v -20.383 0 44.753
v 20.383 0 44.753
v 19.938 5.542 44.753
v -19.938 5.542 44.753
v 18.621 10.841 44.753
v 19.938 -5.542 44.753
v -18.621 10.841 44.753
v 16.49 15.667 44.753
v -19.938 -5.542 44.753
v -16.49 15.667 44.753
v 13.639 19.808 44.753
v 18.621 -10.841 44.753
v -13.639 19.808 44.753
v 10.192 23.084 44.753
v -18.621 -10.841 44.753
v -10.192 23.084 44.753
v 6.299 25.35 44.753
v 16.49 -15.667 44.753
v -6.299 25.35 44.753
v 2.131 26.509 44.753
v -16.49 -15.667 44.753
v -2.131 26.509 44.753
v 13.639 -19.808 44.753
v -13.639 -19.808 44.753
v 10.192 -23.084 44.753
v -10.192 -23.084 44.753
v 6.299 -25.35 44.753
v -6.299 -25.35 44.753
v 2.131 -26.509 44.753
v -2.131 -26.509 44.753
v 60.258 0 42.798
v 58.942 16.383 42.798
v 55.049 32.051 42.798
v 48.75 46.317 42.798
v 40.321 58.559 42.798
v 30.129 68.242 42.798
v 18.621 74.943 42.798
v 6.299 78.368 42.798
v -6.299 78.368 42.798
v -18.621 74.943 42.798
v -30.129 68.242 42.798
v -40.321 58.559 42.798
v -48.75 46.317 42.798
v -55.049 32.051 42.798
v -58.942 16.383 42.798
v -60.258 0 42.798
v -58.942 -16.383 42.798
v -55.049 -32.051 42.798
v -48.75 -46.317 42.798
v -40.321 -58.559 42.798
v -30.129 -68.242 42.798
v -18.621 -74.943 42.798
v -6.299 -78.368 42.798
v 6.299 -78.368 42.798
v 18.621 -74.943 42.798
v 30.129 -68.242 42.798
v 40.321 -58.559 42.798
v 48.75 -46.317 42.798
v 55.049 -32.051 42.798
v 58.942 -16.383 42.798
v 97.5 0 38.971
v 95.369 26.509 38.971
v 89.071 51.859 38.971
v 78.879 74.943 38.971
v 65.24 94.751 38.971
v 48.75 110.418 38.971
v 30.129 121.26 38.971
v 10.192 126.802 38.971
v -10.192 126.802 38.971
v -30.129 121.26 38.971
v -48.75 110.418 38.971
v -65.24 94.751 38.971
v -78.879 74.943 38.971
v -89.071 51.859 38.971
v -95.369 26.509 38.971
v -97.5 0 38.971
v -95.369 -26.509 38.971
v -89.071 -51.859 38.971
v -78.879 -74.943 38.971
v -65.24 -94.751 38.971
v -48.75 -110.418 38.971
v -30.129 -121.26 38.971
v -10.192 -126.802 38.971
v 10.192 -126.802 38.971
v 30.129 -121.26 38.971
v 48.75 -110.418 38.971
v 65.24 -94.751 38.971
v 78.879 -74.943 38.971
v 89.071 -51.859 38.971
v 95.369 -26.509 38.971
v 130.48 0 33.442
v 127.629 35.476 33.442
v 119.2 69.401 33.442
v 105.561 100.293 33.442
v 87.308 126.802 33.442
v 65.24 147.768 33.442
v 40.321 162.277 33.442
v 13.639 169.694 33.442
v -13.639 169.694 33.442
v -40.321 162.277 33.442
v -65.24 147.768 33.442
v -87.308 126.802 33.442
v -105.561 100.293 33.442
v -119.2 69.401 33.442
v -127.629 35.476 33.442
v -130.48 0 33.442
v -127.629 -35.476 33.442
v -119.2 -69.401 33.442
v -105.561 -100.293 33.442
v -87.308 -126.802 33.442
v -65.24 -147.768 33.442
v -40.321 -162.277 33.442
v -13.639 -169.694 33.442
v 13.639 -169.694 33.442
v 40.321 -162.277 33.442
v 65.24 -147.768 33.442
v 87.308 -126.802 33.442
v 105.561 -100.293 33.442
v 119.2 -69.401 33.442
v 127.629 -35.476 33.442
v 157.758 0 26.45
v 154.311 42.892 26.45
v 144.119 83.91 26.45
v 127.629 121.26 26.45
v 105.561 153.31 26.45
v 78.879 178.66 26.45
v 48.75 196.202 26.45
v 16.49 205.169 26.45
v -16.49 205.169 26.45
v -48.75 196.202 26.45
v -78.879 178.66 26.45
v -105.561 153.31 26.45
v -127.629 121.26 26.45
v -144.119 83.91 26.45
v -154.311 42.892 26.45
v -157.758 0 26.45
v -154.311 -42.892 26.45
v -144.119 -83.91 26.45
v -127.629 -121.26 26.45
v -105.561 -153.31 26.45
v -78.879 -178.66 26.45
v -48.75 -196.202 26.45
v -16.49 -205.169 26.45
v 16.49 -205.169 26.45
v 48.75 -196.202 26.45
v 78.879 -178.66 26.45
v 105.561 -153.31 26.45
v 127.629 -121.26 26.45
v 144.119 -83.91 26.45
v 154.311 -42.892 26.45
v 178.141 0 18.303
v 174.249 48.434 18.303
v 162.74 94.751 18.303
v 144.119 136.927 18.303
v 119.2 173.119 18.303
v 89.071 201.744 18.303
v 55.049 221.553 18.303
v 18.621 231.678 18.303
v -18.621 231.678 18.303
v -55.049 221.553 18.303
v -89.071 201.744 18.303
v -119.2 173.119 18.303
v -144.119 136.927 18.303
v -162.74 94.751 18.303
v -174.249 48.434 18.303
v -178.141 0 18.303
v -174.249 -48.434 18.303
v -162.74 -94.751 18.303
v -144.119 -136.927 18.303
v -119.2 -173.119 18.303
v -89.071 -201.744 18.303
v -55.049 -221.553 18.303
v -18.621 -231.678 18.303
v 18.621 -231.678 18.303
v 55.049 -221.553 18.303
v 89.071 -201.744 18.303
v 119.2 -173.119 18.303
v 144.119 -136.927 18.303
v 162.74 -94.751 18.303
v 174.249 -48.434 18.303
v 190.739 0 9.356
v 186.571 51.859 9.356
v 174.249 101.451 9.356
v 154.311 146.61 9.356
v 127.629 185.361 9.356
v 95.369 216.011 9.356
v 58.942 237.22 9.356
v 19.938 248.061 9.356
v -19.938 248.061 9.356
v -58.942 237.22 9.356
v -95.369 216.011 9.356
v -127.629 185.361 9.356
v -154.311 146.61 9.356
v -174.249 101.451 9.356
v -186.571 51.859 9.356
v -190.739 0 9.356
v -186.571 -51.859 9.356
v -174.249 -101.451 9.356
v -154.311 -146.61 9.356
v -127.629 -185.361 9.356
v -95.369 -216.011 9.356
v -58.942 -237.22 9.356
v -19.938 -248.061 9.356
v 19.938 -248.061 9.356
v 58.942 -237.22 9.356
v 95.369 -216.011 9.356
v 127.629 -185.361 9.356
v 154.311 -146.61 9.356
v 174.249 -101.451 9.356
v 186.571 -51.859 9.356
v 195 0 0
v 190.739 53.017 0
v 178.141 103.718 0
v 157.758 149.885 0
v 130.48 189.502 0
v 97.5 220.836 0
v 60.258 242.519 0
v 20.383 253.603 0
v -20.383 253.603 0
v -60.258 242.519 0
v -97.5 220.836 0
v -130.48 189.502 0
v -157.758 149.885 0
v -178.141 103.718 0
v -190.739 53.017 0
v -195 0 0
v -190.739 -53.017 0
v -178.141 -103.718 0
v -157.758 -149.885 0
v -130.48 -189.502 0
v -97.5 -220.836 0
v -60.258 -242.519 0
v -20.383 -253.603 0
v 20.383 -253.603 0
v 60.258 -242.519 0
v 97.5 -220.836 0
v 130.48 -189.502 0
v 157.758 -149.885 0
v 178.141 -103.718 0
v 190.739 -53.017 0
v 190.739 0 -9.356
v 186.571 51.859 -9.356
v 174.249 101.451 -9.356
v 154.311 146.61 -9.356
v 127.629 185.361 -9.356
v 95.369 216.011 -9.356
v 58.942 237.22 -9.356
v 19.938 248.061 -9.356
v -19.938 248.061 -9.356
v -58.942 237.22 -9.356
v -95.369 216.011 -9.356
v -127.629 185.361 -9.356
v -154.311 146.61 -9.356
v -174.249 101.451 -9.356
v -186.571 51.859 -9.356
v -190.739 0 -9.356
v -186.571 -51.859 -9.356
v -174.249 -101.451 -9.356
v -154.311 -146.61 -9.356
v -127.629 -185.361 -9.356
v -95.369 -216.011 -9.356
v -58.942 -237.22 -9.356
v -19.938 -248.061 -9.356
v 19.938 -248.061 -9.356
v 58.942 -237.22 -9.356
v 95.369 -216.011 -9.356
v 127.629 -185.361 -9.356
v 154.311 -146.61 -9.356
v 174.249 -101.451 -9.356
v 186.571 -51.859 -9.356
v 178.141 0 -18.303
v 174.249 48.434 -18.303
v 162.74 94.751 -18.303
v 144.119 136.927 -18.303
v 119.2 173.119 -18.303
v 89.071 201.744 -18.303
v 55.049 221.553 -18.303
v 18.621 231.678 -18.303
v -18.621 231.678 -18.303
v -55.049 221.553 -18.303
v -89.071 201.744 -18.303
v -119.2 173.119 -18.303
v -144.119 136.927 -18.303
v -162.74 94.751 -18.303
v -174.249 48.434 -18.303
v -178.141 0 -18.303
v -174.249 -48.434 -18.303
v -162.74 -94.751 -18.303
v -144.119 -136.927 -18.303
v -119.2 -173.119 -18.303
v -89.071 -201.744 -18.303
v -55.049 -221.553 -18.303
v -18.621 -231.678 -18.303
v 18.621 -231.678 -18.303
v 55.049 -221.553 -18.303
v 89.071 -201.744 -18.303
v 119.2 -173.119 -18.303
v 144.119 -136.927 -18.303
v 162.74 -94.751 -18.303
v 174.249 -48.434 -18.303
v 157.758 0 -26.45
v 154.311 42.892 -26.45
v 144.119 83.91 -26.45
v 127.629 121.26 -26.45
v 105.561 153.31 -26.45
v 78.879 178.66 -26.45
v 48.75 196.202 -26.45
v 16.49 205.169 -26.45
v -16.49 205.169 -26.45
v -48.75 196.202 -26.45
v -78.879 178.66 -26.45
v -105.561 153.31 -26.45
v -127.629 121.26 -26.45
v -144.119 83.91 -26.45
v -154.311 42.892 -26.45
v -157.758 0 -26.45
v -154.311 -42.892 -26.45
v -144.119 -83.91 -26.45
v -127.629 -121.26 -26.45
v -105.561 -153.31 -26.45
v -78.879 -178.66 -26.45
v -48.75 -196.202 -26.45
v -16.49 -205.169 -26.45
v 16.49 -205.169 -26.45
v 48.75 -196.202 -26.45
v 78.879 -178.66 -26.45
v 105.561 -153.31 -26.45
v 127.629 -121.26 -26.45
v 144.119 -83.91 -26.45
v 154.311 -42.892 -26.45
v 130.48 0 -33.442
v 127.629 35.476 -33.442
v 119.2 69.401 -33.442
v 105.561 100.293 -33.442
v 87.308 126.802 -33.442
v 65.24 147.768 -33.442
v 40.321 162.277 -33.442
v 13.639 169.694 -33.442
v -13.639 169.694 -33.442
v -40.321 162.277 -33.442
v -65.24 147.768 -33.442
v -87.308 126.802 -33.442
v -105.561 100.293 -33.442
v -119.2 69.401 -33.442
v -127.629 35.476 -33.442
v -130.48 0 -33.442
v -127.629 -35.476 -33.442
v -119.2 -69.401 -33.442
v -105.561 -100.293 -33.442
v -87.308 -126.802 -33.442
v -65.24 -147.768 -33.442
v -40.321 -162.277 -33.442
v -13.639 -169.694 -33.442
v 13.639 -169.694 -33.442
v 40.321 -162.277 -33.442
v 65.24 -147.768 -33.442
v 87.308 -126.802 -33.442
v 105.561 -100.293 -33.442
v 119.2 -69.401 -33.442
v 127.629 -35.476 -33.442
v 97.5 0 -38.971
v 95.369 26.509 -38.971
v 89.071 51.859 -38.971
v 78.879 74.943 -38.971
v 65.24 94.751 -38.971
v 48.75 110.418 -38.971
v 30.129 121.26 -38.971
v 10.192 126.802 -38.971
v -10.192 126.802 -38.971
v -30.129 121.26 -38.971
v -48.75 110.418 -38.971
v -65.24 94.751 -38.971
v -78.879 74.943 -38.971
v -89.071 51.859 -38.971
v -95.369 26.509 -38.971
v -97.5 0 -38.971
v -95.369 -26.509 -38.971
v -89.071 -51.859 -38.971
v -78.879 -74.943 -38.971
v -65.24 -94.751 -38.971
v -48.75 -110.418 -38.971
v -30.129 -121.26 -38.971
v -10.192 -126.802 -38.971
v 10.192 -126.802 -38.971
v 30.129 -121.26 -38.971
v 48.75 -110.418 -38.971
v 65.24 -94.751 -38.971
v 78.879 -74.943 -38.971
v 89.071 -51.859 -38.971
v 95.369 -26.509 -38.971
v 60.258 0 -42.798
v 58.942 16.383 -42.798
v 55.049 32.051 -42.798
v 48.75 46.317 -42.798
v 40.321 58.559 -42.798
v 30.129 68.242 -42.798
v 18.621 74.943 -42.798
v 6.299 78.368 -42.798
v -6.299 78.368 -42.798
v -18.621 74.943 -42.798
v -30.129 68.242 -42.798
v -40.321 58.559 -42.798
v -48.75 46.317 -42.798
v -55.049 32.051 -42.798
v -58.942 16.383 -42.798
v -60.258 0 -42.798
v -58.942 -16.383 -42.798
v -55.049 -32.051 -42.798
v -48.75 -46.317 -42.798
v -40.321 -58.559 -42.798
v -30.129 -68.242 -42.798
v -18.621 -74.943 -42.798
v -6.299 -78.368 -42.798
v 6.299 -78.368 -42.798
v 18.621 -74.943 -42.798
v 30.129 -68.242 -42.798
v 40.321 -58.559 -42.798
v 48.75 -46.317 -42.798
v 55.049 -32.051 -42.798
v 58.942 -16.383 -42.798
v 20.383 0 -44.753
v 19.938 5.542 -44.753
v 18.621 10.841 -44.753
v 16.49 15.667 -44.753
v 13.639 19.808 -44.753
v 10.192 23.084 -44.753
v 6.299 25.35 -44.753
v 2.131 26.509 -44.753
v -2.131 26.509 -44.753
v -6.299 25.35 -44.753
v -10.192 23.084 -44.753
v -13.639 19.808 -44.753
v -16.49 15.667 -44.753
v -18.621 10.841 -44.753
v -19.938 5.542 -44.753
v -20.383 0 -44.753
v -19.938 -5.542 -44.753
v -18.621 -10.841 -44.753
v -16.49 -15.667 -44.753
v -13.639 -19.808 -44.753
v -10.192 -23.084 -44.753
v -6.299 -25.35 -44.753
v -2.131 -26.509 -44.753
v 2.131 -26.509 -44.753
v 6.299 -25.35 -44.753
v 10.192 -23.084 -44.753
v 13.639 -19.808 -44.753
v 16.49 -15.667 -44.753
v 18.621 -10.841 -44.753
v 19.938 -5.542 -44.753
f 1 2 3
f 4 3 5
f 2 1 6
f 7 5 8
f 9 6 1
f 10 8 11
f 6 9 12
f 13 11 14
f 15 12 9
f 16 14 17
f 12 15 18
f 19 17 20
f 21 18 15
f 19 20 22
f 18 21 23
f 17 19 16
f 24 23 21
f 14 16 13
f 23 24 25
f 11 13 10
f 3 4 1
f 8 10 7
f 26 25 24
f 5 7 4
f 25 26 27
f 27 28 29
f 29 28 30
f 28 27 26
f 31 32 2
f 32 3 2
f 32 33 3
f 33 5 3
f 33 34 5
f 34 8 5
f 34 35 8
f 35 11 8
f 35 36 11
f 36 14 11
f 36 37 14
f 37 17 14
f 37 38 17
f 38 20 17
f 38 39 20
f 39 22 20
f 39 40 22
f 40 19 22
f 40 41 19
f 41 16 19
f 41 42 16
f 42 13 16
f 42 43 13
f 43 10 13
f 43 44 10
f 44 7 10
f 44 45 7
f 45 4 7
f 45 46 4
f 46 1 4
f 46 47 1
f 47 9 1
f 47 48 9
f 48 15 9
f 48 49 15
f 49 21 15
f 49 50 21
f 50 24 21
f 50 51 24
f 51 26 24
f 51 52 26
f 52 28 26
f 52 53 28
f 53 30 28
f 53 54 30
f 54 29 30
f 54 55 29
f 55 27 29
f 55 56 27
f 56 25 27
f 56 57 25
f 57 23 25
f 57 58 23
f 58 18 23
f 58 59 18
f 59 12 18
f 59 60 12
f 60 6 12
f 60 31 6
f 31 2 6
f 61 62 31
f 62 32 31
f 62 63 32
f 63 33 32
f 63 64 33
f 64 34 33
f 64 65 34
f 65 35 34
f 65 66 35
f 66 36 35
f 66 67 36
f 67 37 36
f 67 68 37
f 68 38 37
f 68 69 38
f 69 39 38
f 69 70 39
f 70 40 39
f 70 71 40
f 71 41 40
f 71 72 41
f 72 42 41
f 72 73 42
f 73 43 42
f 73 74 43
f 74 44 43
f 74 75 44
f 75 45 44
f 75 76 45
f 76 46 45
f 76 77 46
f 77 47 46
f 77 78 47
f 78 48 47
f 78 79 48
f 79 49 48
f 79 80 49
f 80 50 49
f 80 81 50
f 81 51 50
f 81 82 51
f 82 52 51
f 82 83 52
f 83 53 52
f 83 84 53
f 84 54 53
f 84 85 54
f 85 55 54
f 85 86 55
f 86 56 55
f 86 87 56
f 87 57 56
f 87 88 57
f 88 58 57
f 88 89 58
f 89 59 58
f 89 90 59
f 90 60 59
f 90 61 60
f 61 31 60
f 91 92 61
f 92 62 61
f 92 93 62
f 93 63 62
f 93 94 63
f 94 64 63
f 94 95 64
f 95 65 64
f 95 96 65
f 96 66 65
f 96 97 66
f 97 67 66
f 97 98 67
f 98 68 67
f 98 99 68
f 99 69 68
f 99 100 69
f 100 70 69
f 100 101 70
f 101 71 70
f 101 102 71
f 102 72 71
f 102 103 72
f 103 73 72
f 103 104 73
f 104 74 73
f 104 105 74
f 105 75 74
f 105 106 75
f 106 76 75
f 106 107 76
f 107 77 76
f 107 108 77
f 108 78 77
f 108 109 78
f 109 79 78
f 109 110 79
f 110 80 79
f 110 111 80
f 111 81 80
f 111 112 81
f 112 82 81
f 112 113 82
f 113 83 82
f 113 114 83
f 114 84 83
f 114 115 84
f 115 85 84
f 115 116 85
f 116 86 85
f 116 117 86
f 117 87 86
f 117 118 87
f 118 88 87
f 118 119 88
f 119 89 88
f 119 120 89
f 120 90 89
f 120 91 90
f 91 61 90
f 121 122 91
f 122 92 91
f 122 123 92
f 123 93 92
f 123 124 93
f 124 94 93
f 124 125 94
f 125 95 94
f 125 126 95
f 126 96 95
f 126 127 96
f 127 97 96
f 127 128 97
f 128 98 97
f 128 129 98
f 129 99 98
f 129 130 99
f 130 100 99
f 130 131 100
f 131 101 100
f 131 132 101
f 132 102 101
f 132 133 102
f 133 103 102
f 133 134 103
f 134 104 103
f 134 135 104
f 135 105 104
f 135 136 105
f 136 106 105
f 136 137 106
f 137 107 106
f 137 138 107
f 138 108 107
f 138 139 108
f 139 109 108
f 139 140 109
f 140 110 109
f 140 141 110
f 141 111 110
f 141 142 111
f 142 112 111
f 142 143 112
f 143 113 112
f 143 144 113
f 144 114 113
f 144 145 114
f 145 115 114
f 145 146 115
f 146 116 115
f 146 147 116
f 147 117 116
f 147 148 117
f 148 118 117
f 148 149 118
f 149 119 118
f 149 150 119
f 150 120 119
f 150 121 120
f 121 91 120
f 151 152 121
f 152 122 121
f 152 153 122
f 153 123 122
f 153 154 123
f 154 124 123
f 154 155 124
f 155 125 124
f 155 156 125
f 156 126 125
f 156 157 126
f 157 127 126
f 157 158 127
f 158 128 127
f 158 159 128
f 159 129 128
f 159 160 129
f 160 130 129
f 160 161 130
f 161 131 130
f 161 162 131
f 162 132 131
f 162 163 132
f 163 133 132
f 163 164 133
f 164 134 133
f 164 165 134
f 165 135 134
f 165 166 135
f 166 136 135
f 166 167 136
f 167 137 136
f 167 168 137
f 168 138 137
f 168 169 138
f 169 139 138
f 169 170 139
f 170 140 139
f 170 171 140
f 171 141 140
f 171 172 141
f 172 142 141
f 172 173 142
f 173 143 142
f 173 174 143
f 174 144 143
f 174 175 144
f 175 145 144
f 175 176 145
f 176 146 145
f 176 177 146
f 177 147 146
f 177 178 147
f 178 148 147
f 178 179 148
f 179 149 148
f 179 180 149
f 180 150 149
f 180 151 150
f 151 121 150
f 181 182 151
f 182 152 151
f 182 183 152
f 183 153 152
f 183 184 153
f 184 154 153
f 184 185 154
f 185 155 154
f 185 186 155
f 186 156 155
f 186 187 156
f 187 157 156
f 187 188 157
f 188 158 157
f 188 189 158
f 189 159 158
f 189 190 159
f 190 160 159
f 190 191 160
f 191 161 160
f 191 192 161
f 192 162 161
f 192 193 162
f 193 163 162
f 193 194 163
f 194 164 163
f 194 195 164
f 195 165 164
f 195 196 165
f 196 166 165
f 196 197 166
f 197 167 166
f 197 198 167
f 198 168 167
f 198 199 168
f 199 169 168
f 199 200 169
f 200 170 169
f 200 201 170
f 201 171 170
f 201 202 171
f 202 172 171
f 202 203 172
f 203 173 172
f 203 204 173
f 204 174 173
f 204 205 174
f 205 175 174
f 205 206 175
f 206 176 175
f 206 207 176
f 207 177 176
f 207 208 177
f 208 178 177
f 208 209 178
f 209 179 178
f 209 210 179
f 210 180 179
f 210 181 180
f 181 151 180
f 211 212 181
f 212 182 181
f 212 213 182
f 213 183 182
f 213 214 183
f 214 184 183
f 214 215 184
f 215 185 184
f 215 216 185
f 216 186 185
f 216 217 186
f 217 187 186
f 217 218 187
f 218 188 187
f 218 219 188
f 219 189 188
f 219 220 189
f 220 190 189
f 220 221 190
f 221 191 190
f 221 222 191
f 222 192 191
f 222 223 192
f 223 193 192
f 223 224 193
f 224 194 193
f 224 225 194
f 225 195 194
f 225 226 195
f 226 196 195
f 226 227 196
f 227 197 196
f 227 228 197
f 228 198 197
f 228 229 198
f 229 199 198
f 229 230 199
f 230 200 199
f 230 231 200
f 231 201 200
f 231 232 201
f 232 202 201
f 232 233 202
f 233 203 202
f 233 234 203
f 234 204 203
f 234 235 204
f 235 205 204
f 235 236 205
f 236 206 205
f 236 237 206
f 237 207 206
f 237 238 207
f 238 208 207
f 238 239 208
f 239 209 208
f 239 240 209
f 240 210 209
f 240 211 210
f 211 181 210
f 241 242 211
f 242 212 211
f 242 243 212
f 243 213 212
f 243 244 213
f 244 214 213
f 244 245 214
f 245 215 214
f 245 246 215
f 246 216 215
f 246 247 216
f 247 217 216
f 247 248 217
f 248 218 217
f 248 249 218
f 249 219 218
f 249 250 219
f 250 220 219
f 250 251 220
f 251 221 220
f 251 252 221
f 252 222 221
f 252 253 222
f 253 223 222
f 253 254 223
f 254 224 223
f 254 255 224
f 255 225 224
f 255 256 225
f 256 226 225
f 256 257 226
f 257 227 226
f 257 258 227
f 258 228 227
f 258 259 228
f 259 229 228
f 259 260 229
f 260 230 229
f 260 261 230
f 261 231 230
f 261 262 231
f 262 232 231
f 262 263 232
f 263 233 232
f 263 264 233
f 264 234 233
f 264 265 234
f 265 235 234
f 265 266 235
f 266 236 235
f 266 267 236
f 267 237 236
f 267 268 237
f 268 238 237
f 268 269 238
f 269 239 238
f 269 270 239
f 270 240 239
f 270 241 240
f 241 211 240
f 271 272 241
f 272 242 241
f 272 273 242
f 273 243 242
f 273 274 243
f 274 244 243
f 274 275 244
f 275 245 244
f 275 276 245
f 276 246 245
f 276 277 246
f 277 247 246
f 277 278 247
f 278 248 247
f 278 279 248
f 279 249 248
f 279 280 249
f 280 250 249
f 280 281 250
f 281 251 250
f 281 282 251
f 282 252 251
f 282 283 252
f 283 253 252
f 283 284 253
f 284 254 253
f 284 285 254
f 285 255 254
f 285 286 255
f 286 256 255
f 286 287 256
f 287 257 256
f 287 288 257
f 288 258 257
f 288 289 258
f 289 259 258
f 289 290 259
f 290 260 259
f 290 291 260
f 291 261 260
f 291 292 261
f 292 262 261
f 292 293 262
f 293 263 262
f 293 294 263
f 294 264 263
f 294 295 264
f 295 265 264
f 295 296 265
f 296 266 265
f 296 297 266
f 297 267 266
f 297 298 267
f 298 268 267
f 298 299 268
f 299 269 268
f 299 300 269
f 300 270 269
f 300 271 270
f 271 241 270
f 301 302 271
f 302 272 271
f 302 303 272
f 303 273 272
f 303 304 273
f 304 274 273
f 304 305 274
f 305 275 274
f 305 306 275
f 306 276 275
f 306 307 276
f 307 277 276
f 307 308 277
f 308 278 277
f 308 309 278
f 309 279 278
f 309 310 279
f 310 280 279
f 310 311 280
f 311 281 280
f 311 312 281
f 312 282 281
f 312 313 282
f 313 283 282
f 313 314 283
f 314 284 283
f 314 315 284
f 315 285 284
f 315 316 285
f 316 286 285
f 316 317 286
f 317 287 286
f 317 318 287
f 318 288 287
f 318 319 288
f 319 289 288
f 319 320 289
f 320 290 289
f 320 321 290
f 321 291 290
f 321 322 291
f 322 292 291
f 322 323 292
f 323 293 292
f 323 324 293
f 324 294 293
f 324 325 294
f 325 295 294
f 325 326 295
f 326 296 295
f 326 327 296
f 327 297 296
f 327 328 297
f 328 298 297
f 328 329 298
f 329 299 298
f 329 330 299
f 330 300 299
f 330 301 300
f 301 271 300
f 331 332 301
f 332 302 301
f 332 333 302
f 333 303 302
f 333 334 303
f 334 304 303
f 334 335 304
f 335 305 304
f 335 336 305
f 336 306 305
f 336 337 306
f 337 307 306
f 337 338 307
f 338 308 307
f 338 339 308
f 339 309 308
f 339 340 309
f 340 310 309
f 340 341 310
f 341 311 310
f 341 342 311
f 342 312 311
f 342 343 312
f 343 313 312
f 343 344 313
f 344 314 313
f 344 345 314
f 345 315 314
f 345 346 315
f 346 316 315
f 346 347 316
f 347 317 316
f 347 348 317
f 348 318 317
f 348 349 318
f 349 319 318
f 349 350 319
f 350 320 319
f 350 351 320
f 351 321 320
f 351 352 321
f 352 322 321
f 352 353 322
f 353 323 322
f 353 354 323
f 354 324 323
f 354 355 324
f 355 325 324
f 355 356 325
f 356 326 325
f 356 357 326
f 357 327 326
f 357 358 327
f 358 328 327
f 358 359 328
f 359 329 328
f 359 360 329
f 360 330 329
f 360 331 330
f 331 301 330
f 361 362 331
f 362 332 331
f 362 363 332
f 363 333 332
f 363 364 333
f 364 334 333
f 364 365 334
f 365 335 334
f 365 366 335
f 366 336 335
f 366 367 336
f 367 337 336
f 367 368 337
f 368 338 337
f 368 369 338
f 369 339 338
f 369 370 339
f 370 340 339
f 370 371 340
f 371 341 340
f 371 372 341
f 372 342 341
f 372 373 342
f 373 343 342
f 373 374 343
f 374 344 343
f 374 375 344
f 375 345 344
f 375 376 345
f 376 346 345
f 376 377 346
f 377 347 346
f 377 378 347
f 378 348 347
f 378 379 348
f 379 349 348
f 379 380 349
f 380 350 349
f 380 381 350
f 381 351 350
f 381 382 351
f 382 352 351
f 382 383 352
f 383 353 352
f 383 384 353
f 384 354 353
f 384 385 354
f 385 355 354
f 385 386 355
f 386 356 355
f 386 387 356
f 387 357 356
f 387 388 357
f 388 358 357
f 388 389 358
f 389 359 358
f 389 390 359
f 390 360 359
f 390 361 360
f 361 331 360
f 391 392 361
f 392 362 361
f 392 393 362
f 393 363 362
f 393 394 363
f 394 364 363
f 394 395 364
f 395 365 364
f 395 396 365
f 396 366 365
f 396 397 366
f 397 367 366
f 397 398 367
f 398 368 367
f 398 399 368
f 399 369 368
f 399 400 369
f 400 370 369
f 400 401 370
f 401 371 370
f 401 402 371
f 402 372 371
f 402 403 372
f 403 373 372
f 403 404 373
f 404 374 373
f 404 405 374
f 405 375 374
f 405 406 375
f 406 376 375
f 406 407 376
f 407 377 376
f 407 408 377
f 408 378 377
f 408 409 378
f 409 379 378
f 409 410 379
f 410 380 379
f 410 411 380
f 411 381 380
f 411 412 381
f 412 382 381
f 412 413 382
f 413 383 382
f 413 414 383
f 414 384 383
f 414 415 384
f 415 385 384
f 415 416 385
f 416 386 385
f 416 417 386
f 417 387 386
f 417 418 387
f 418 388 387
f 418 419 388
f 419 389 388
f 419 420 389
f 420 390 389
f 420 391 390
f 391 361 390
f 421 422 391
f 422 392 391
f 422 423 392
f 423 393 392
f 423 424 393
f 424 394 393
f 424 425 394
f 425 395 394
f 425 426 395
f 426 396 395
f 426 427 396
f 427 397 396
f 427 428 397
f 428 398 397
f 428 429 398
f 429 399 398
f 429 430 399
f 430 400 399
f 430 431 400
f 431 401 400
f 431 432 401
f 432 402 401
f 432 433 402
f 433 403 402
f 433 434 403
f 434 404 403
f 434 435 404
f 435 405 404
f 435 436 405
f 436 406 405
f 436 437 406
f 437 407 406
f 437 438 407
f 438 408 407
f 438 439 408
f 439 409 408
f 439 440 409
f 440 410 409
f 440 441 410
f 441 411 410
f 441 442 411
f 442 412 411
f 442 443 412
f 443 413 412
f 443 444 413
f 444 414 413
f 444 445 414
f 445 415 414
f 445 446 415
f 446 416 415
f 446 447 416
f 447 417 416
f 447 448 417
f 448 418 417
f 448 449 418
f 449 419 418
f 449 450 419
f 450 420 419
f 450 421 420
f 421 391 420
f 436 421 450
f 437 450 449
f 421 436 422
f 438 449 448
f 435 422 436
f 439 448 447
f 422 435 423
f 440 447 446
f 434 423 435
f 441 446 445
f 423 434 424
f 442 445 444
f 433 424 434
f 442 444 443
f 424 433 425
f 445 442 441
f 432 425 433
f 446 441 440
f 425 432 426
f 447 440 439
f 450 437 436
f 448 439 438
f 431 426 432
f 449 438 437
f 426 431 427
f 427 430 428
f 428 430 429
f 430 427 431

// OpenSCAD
// Generated by SolidPython 1.0.1 on 2020-07-29 00:46:51


scale(v = [13, 17, 3]) {
	sphere(r = 15);
}
/***********************************************
*********      SolidPython code:      **********
************************************************
 
# import packages: SolidPython
from solid import *
from solid.utils import *
from itertools import chain, combinations, permutations


class Resize:

    def __init__(self, scad_file):
        self.scad_file = scad_file
        #self.scad_file = import_scad(scad_file)
        # cone/cylinder param:
        self.r1 = 0
        self.r2 = 0
        self.h = 0
        # rectangular prism param:
        self.w = 0
        self.l = 0
        # ellipse param:
        self.r = 0

    # import OpenScad code (file name corresponds to shape)


    # classify shape + parameters
    def assign(self, param1, param2, param3):
        if self.scad_file == 'cone.scad':
            self.r1 = param1
            self.r2 = param2
            self.h = param3
        elif self.scad_file == 'cylinder.scad':
            self.r1 = param1
            self.r2 = param2
            self.h = param3
        elif self.scad_file == 'rectangularPrism.scad':
            self.h = param1
            self.l = param2
            self.w = param3
        else:
            self.r = param1
            self.h = param2

    # resize parameters
    def iterate(self):
        x = range(3, 20, 2)
        i = 1
        if self.scad_file == 'cone.scad':
            tempList = list(permutations(x, 2))
            for temp in tempList:
                param1 = temp[0]
                param2 = temp[1]
                filepath = 'produced_scad_files/' + 'cone' + str(param1) + '_' + str(param2) + '_' + '.scad'
                scad_render_to_file(cylinder(h=param1, r1=param2, r2=0), filepath)

        elif self.scad_file == 'cylinder.scad':
            tempList = list(permutations(x, 3))
            for temp in tempList:
                param1 = temp[0]
                param2 = temp[1]
                filepath = 'produced_scad_files/' + 'cylinder' + str(param1) + '_' + str(param2) + '_' + '.scad'
                scad_render_to_file(cylinder(h=param1, r1=param2, r2=param2), filepath)

        elif self.scad_file == 'rectangularPrism.scad':
            tempList = list(permutations(x, 3))
            for temp in tempList:
                param1 = temp[0]
                param2 = temp[1]
                param3 = temp[2]
                filepath = 'produced_scad_files/' + 'rectangularPrism' + str(param1) + '_' + str(param2) + '_' + str(
                    param3) + '.scad'
                scad_render_to_file(cube(size=(param1, param2, param3)), filepath)

        elif self.scad_file == 'ellipse.scad':
            tempList = list(permutations(x, 4))
            for temp in tempList:
                param1 = temp[0]
                param2 = temp[1]
                param3 = temp[2]
                param4 = temp[3]
                filepath = 'produced_scad_files/' + 'ellipse' + str(param1) + '_' + str(param2) + '_' + str(param3) + '_' + str(param4) + '.scad'
                scad_render_to_file(scale([param1, param2, param3])(sphere(r=param4)), filepath)

    def render_to_scadfile(self):
        scad_render_to_file(scad, 'example.scad') 
 
************************************************/
